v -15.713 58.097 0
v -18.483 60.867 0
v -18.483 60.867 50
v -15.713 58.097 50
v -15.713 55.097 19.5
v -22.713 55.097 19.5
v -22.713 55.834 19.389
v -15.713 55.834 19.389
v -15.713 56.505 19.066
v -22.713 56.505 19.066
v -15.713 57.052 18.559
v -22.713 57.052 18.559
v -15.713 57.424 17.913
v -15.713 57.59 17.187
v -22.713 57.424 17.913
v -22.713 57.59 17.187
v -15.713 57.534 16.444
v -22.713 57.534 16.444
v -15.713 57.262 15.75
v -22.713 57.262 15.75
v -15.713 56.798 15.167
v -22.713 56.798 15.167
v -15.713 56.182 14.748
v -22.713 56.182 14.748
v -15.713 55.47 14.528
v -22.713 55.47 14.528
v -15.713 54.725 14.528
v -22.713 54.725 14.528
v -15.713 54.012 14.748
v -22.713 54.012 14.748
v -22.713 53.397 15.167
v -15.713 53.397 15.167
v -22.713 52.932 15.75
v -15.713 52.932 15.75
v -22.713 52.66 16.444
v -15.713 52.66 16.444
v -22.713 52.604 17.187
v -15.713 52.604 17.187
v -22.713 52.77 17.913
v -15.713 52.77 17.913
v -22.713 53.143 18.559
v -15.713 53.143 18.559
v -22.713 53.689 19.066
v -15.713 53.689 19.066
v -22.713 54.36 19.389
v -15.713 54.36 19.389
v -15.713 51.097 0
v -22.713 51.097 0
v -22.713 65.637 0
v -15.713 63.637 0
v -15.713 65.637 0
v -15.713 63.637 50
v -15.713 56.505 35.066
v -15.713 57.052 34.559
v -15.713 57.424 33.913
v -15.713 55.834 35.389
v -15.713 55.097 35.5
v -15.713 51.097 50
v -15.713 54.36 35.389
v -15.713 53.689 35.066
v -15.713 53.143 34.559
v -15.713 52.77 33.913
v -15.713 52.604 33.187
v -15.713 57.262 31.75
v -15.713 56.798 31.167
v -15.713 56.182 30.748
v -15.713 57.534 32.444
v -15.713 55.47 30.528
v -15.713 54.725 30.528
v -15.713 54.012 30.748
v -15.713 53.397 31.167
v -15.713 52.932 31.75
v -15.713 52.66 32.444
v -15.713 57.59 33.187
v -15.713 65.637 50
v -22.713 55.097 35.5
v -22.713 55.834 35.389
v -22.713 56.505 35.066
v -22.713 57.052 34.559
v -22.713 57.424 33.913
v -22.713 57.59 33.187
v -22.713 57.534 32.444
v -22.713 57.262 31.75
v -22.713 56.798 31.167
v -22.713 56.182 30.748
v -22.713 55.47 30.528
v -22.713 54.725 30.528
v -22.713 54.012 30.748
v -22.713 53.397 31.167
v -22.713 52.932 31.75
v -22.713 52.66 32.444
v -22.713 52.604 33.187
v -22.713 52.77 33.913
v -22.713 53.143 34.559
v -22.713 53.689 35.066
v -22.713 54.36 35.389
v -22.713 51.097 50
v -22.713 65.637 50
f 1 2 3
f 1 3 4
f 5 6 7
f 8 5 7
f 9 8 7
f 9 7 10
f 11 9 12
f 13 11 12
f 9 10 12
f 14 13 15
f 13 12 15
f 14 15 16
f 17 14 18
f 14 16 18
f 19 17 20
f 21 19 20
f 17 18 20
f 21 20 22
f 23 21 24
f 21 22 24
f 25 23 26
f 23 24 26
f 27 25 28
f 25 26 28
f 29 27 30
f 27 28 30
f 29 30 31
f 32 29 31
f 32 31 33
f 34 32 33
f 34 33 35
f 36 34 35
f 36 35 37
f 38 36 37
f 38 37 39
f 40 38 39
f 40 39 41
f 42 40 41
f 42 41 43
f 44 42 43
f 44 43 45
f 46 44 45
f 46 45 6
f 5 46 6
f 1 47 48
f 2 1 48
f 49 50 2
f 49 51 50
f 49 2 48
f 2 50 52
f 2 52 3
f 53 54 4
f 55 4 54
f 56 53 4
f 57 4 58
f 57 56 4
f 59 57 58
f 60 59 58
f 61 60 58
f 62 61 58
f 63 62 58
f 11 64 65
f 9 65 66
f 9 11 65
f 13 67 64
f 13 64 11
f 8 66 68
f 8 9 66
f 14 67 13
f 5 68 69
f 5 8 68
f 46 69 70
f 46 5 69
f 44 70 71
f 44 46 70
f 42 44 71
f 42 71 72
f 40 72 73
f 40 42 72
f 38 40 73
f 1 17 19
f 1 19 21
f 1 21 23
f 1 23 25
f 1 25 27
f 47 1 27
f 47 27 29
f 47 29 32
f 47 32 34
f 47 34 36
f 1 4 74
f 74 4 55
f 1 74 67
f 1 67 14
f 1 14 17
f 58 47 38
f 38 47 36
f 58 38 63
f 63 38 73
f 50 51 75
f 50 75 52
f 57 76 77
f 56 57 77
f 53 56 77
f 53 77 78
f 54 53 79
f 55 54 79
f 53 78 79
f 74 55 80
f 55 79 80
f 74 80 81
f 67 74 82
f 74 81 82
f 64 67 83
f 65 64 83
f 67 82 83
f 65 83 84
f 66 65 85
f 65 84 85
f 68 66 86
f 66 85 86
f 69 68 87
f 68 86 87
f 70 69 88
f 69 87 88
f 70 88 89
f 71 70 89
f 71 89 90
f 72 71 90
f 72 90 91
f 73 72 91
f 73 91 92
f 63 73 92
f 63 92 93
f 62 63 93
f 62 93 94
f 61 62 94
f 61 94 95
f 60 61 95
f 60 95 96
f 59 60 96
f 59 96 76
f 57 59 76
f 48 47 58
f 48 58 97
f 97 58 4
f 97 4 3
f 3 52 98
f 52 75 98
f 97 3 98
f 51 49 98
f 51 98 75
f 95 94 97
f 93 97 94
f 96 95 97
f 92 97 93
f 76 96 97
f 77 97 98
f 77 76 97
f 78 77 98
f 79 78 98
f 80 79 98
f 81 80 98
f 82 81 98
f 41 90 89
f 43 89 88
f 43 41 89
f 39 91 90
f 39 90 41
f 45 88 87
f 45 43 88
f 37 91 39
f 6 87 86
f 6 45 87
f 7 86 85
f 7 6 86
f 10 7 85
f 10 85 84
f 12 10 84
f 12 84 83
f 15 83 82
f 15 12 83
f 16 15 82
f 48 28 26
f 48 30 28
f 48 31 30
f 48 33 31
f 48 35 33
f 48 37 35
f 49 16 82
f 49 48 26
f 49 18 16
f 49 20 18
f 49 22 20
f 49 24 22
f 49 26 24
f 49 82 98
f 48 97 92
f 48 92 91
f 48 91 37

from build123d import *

# Parameters (mm, degrees)
BOSS_EXTRUDE1_DEPTH = 50
CUT_EXTRUDE1_REACH  = 9
SKETCH3_R           = 2.5


with BuildPart() as part:
    # Sketch2 → Boss-Extrude1 (new body)
    with BuildSketch(Plane.XY):
        Polygon((-15.713485752, 63.637116303), (-18.483485752, 60.867117128), (-15.713485752, 58.097116303), (-15.713485752, 51.097116303), (-22.713485752, 51.097116303), (-22.713485752, 65.637116303), (-15.713485752, 65.637116303), align=None)
    extrude(amount=BOSS_EXTRUDE1_DEPTH)

    # Sketch3 → Cut-Extrude1 (cut, up to next)
    with BuildSketch(Plane.ZY.offset(22.713485752), mode=Mode.PRIVATE) as cut_extrude1_sk1:
        with Locations((17, 55.097116303)):
            Circle(SKETCH3_R)
    cut_extrude1_tool1 = extrude(cut_extrude1_sk1.sketch, amount=-CUT_EXTRUDE1_REACH, mode=Mode.PRIVATE) & part.part
    add(cut_extrude1_tool1.solids().sort_by_distance((-22.713486, 55.097116, 17))[0], mode=Mode.SUBTRACT)
    # Sketch3 → Cut-Extrude1 (cut, up to next)
    with BuildSketch(Plane.ZY.offset(22.713485752), mode=Mode.PRIVATE) as cut_extrude1_sk2:
        with Locations((33, 55.097116303)):
            Circle(SKETCH3_R)
    cut_extrude1_tool2 = extrude(cut_extrude1_sk2.sketch, amount=-CUT_EXTRUDE1_REACH, mode=Mode.PRIVATE) & part.part
    add(cut_extrude1_tool2.solids().sort_by_distance((-22.713486, 55.097116, 33))[0], mode=Mode.SUBTRACT)


solid = part.part
